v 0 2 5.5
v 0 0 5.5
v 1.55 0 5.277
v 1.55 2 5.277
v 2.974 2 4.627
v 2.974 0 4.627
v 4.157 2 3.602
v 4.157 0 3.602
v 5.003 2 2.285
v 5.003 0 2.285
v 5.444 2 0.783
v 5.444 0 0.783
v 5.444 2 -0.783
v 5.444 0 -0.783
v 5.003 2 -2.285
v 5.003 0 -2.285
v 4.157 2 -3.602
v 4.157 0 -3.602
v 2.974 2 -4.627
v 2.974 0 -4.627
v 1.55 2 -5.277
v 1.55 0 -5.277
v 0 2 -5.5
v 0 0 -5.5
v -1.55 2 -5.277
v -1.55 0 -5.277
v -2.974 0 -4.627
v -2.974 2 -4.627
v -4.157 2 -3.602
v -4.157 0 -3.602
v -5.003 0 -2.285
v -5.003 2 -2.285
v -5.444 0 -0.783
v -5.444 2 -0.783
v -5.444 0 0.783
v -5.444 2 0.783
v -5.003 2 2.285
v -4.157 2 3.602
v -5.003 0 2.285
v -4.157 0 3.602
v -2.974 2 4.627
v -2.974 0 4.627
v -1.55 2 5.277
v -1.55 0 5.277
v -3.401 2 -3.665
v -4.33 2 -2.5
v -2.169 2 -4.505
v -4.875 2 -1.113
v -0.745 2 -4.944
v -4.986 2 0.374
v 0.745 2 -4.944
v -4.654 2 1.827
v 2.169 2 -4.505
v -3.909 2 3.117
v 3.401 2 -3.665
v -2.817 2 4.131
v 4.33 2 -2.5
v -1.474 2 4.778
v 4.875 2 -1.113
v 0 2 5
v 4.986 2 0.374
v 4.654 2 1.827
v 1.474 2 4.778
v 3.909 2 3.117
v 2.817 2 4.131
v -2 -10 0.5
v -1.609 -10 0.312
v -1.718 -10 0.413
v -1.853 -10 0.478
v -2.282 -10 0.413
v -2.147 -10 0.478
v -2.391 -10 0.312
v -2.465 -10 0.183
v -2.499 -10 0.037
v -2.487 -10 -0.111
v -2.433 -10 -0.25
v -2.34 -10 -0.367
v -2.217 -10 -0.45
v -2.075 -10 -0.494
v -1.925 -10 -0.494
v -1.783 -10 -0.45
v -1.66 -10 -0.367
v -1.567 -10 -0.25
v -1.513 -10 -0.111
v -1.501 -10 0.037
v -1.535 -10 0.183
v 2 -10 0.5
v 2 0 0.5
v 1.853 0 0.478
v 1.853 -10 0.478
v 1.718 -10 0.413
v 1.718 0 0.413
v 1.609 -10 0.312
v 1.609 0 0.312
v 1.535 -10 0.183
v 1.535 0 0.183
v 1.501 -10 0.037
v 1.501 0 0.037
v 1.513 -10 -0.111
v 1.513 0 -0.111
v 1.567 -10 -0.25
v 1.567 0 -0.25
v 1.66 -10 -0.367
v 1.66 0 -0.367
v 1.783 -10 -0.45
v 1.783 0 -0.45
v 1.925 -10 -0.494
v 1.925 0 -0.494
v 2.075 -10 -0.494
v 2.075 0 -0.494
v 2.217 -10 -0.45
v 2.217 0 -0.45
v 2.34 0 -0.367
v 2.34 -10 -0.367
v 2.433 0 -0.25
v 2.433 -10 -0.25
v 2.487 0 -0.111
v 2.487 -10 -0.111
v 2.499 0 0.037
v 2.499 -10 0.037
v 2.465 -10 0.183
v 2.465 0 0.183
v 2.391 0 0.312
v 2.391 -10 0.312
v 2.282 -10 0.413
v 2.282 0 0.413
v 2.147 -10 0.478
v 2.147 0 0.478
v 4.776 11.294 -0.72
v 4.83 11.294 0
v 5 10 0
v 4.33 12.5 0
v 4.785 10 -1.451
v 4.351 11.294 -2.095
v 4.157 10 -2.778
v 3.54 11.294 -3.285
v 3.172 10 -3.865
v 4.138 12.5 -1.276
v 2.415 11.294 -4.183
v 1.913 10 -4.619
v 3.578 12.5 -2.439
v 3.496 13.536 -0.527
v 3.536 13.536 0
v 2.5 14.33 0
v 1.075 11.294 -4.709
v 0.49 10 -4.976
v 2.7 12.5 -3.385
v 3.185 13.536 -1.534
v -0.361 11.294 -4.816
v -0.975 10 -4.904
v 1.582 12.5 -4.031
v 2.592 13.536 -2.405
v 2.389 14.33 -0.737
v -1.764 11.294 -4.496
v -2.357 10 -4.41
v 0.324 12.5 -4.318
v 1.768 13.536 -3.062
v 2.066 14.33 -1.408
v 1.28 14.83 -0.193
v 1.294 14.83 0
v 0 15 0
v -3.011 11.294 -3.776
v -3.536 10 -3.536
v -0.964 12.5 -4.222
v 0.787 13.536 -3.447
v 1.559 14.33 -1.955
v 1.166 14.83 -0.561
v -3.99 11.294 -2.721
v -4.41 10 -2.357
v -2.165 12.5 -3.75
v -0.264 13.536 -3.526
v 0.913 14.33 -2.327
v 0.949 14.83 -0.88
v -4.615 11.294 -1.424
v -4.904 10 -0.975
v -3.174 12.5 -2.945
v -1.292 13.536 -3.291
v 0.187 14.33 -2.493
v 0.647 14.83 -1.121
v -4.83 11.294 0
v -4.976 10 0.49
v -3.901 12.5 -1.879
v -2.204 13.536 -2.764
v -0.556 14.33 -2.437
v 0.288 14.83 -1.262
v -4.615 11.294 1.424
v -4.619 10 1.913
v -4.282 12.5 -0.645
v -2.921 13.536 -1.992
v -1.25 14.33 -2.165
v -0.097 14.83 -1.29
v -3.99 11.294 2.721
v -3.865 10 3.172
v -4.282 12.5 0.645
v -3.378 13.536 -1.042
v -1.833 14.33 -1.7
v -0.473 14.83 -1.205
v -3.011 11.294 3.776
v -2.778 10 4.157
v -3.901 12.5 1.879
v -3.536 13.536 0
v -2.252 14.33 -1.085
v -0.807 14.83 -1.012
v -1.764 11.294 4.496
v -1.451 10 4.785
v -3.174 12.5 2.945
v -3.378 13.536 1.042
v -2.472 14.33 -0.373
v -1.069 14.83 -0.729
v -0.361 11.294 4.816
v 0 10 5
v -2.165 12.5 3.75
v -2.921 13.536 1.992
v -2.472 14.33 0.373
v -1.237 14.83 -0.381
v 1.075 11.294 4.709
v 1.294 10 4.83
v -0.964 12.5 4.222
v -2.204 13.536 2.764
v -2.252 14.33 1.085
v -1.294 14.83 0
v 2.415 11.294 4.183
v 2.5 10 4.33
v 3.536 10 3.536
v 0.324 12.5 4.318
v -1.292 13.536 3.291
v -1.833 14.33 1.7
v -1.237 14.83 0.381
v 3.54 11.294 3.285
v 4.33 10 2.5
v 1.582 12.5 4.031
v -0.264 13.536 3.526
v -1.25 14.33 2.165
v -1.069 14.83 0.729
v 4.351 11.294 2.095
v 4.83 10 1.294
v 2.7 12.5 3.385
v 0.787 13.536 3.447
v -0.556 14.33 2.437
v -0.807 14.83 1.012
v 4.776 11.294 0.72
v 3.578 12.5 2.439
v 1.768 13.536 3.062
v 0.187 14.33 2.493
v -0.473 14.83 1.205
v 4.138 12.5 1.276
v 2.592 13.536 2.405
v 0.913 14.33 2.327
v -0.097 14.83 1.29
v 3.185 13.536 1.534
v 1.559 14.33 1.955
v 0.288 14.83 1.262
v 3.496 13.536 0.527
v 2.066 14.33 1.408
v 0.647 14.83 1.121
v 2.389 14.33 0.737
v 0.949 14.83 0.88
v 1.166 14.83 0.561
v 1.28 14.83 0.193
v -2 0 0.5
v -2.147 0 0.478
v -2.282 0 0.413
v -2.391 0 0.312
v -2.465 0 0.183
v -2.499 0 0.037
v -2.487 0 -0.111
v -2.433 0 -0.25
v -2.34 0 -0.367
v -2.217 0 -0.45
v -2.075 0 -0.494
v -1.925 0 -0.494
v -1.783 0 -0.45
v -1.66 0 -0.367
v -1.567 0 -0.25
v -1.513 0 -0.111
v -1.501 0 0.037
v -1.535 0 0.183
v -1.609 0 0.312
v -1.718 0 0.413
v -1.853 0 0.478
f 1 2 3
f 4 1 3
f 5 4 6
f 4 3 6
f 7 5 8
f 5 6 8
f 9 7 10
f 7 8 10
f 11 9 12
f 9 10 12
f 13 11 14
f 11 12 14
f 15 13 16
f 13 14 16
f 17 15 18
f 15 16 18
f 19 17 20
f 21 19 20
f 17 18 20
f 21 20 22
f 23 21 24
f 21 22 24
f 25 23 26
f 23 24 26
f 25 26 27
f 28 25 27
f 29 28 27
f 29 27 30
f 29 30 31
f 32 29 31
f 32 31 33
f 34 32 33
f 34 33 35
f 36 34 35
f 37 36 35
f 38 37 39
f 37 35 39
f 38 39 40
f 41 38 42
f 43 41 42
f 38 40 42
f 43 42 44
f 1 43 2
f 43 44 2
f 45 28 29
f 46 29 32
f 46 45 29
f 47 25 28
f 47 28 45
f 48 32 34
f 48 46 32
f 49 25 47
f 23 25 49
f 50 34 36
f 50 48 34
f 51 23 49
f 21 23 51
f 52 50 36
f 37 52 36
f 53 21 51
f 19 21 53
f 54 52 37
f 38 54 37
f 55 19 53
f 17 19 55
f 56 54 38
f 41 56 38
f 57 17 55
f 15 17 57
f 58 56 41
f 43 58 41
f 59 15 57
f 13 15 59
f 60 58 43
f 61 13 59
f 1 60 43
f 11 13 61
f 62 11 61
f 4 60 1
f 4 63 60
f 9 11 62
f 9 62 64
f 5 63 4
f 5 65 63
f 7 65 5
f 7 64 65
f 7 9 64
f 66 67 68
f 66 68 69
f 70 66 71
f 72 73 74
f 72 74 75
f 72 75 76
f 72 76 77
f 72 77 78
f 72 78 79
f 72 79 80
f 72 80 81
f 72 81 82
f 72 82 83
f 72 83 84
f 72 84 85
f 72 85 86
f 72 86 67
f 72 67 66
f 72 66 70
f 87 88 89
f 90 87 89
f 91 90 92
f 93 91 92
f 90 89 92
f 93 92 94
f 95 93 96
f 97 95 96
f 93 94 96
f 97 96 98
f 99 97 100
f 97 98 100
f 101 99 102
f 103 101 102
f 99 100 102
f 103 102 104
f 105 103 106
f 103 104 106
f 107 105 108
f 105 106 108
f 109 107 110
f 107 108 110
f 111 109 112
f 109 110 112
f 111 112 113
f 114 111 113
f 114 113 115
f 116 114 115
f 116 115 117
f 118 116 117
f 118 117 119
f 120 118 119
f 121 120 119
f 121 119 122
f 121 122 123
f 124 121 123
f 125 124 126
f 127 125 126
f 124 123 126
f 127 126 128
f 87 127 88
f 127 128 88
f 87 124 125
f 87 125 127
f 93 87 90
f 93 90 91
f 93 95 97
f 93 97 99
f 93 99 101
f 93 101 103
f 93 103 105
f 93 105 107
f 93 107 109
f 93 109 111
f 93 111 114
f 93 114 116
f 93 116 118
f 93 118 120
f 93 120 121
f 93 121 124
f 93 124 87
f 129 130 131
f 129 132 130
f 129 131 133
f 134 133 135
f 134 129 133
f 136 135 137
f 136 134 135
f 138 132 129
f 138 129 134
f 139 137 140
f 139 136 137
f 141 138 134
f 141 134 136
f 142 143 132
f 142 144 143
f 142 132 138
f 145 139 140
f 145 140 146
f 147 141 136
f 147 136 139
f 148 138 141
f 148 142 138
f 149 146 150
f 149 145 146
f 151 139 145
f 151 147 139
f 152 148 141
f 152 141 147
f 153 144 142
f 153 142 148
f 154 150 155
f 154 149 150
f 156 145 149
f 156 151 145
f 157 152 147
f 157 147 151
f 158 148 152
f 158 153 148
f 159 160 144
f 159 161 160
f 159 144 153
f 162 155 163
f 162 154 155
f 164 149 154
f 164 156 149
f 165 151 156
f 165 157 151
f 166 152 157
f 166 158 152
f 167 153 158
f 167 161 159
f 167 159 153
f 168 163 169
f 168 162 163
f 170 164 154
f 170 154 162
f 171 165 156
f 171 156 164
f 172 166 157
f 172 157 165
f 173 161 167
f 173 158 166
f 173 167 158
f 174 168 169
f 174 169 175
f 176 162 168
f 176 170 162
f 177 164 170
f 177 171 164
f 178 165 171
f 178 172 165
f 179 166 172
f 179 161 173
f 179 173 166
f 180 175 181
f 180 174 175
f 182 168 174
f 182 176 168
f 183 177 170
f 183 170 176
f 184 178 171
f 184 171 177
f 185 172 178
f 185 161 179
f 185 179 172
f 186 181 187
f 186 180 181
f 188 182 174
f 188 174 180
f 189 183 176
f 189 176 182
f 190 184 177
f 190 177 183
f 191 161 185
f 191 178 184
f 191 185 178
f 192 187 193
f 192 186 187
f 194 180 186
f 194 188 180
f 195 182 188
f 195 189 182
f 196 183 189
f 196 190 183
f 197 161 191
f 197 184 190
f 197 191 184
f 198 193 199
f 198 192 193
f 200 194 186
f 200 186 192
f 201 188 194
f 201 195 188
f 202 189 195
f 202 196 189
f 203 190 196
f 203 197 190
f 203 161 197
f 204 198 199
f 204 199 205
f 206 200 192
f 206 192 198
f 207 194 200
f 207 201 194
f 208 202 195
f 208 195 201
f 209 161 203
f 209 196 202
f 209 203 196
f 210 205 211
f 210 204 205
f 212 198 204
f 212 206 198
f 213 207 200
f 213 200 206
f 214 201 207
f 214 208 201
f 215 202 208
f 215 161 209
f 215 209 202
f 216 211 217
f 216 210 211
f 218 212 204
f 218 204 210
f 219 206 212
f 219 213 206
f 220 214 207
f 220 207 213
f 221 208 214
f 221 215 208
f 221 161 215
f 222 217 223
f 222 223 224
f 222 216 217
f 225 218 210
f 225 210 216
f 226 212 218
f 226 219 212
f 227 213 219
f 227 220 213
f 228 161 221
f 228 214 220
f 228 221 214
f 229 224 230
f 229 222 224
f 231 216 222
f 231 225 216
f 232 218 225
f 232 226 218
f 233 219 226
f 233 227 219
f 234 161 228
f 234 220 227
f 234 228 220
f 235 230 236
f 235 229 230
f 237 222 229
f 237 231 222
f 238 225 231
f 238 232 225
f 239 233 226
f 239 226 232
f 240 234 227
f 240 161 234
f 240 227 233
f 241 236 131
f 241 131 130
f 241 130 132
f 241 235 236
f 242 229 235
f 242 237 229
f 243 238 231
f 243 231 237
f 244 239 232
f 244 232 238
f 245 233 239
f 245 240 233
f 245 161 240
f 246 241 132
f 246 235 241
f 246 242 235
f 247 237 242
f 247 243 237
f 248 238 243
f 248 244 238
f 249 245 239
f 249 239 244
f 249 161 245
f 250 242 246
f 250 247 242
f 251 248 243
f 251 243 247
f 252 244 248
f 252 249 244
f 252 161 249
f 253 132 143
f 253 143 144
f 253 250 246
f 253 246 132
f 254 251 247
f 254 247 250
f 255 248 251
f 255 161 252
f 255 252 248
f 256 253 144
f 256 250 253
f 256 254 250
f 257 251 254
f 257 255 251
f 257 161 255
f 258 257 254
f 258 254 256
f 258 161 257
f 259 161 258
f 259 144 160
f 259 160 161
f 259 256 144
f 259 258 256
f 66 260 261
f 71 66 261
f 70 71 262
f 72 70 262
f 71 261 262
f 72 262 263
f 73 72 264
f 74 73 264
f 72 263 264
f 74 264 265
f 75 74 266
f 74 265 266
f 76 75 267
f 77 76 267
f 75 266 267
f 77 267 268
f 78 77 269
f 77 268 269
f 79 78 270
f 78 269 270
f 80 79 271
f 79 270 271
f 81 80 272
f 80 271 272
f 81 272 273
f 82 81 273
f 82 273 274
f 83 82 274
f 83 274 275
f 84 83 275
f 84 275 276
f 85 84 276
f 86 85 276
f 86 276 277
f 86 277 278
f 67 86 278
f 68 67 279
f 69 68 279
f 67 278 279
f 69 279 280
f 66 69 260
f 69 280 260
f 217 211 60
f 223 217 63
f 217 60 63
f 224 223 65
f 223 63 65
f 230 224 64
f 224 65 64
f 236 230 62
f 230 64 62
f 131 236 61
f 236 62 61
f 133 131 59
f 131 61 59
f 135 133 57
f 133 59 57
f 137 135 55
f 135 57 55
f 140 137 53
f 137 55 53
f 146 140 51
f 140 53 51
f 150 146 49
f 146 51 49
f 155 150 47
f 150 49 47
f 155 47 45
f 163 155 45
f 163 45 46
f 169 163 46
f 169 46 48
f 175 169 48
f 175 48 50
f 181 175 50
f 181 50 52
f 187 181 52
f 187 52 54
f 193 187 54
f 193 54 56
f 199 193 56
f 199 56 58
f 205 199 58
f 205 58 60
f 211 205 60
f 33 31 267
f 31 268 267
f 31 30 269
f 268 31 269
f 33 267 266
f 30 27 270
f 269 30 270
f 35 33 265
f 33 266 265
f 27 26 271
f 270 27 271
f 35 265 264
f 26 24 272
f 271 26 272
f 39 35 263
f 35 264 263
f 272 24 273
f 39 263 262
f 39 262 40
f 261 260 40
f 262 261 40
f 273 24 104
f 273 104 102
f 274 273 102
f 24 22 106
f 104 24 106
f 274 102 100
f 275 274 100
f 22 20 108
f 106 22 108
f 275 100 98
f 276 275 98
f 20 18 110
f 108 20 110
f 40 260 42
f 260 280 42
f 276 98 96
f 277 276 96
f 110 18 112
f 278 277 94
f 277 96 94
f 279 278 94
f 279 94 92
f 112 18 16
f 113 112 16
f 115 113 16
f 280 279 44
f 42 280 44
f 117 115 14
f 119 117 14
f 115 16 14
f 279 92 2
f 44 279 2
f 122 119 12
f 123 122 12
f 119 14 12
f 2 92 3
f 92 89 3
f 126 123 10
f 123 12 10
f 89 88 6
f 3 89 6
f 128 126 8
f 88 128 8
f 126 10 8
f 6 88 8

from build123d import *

# Parameters (mm, degrees)
SKETCH1_R           = 5.5
BOSS_EXTRUDE1_DEPTH = 2
SKETCH2_R           = 5
BOSS_EXTRUDE2_DEPTH = 8
SKETCH4_R           = 0.5
BOSS_EXTRUDE3_DEPTH = 10


# Read off the part's stored shape, not the designer's step: Dome1
with BuildPart() as part:
    # Sketch1 → Boss-Extrude1 (new body)
    with BuildSketch(Plane(origin=(0, 0, 0), x_dir=(1, 0, 0), z_dir=(0, 1, 0))):
        with Locations(Location((0, 0, 0), (0, 0, 270))):
            Circle(SKETCH1_R)
    extrude(amount=BOSS_EXTRUDE1_DEPTH)

    # Sketch2 → Boss-Extrude2 (add)
    with BuildSketch(Plane(origin=(0, 2, 0), x_dir=(1, 0, 0), z_dir=(0, 1, 0))):
        with Locations(Location((0, 0, 0), (0, 0, 270))):
            Circle(SKETCH2_R)
    extrude(amount=BOSS_EXTRUDE2_DEPTH)

    # Dome1 outline → Dome1 (revolve)
    with BuildSketch(Plane.XY):
        with BuildLine():
            Line((0, 10), (5, 9.999999995))
            ThreePointArc((5, 9.999999995), (3.535533908, 13.535533904), (0, 15))
            Line((0, 15), (0, 10))
        make_face()
    revolve(axis=Axis((0, 0, 0), (0, 1, 0)))

    # Sketch4 → Boss-Extrude3 (add)
    with BuildSketch(Plane.XZ):
        with Locations(Location((-2, 0, 0), (0, 0, 90))):
            Circle(SKETCH4_R)
        with Locations(Location((2, 0, 0), (0, 0, 90))):
            Circle(SKETCH4_R)
    extrude(amount=BOSS_EXTRUDE3_DEPTH)


solid = part.part
